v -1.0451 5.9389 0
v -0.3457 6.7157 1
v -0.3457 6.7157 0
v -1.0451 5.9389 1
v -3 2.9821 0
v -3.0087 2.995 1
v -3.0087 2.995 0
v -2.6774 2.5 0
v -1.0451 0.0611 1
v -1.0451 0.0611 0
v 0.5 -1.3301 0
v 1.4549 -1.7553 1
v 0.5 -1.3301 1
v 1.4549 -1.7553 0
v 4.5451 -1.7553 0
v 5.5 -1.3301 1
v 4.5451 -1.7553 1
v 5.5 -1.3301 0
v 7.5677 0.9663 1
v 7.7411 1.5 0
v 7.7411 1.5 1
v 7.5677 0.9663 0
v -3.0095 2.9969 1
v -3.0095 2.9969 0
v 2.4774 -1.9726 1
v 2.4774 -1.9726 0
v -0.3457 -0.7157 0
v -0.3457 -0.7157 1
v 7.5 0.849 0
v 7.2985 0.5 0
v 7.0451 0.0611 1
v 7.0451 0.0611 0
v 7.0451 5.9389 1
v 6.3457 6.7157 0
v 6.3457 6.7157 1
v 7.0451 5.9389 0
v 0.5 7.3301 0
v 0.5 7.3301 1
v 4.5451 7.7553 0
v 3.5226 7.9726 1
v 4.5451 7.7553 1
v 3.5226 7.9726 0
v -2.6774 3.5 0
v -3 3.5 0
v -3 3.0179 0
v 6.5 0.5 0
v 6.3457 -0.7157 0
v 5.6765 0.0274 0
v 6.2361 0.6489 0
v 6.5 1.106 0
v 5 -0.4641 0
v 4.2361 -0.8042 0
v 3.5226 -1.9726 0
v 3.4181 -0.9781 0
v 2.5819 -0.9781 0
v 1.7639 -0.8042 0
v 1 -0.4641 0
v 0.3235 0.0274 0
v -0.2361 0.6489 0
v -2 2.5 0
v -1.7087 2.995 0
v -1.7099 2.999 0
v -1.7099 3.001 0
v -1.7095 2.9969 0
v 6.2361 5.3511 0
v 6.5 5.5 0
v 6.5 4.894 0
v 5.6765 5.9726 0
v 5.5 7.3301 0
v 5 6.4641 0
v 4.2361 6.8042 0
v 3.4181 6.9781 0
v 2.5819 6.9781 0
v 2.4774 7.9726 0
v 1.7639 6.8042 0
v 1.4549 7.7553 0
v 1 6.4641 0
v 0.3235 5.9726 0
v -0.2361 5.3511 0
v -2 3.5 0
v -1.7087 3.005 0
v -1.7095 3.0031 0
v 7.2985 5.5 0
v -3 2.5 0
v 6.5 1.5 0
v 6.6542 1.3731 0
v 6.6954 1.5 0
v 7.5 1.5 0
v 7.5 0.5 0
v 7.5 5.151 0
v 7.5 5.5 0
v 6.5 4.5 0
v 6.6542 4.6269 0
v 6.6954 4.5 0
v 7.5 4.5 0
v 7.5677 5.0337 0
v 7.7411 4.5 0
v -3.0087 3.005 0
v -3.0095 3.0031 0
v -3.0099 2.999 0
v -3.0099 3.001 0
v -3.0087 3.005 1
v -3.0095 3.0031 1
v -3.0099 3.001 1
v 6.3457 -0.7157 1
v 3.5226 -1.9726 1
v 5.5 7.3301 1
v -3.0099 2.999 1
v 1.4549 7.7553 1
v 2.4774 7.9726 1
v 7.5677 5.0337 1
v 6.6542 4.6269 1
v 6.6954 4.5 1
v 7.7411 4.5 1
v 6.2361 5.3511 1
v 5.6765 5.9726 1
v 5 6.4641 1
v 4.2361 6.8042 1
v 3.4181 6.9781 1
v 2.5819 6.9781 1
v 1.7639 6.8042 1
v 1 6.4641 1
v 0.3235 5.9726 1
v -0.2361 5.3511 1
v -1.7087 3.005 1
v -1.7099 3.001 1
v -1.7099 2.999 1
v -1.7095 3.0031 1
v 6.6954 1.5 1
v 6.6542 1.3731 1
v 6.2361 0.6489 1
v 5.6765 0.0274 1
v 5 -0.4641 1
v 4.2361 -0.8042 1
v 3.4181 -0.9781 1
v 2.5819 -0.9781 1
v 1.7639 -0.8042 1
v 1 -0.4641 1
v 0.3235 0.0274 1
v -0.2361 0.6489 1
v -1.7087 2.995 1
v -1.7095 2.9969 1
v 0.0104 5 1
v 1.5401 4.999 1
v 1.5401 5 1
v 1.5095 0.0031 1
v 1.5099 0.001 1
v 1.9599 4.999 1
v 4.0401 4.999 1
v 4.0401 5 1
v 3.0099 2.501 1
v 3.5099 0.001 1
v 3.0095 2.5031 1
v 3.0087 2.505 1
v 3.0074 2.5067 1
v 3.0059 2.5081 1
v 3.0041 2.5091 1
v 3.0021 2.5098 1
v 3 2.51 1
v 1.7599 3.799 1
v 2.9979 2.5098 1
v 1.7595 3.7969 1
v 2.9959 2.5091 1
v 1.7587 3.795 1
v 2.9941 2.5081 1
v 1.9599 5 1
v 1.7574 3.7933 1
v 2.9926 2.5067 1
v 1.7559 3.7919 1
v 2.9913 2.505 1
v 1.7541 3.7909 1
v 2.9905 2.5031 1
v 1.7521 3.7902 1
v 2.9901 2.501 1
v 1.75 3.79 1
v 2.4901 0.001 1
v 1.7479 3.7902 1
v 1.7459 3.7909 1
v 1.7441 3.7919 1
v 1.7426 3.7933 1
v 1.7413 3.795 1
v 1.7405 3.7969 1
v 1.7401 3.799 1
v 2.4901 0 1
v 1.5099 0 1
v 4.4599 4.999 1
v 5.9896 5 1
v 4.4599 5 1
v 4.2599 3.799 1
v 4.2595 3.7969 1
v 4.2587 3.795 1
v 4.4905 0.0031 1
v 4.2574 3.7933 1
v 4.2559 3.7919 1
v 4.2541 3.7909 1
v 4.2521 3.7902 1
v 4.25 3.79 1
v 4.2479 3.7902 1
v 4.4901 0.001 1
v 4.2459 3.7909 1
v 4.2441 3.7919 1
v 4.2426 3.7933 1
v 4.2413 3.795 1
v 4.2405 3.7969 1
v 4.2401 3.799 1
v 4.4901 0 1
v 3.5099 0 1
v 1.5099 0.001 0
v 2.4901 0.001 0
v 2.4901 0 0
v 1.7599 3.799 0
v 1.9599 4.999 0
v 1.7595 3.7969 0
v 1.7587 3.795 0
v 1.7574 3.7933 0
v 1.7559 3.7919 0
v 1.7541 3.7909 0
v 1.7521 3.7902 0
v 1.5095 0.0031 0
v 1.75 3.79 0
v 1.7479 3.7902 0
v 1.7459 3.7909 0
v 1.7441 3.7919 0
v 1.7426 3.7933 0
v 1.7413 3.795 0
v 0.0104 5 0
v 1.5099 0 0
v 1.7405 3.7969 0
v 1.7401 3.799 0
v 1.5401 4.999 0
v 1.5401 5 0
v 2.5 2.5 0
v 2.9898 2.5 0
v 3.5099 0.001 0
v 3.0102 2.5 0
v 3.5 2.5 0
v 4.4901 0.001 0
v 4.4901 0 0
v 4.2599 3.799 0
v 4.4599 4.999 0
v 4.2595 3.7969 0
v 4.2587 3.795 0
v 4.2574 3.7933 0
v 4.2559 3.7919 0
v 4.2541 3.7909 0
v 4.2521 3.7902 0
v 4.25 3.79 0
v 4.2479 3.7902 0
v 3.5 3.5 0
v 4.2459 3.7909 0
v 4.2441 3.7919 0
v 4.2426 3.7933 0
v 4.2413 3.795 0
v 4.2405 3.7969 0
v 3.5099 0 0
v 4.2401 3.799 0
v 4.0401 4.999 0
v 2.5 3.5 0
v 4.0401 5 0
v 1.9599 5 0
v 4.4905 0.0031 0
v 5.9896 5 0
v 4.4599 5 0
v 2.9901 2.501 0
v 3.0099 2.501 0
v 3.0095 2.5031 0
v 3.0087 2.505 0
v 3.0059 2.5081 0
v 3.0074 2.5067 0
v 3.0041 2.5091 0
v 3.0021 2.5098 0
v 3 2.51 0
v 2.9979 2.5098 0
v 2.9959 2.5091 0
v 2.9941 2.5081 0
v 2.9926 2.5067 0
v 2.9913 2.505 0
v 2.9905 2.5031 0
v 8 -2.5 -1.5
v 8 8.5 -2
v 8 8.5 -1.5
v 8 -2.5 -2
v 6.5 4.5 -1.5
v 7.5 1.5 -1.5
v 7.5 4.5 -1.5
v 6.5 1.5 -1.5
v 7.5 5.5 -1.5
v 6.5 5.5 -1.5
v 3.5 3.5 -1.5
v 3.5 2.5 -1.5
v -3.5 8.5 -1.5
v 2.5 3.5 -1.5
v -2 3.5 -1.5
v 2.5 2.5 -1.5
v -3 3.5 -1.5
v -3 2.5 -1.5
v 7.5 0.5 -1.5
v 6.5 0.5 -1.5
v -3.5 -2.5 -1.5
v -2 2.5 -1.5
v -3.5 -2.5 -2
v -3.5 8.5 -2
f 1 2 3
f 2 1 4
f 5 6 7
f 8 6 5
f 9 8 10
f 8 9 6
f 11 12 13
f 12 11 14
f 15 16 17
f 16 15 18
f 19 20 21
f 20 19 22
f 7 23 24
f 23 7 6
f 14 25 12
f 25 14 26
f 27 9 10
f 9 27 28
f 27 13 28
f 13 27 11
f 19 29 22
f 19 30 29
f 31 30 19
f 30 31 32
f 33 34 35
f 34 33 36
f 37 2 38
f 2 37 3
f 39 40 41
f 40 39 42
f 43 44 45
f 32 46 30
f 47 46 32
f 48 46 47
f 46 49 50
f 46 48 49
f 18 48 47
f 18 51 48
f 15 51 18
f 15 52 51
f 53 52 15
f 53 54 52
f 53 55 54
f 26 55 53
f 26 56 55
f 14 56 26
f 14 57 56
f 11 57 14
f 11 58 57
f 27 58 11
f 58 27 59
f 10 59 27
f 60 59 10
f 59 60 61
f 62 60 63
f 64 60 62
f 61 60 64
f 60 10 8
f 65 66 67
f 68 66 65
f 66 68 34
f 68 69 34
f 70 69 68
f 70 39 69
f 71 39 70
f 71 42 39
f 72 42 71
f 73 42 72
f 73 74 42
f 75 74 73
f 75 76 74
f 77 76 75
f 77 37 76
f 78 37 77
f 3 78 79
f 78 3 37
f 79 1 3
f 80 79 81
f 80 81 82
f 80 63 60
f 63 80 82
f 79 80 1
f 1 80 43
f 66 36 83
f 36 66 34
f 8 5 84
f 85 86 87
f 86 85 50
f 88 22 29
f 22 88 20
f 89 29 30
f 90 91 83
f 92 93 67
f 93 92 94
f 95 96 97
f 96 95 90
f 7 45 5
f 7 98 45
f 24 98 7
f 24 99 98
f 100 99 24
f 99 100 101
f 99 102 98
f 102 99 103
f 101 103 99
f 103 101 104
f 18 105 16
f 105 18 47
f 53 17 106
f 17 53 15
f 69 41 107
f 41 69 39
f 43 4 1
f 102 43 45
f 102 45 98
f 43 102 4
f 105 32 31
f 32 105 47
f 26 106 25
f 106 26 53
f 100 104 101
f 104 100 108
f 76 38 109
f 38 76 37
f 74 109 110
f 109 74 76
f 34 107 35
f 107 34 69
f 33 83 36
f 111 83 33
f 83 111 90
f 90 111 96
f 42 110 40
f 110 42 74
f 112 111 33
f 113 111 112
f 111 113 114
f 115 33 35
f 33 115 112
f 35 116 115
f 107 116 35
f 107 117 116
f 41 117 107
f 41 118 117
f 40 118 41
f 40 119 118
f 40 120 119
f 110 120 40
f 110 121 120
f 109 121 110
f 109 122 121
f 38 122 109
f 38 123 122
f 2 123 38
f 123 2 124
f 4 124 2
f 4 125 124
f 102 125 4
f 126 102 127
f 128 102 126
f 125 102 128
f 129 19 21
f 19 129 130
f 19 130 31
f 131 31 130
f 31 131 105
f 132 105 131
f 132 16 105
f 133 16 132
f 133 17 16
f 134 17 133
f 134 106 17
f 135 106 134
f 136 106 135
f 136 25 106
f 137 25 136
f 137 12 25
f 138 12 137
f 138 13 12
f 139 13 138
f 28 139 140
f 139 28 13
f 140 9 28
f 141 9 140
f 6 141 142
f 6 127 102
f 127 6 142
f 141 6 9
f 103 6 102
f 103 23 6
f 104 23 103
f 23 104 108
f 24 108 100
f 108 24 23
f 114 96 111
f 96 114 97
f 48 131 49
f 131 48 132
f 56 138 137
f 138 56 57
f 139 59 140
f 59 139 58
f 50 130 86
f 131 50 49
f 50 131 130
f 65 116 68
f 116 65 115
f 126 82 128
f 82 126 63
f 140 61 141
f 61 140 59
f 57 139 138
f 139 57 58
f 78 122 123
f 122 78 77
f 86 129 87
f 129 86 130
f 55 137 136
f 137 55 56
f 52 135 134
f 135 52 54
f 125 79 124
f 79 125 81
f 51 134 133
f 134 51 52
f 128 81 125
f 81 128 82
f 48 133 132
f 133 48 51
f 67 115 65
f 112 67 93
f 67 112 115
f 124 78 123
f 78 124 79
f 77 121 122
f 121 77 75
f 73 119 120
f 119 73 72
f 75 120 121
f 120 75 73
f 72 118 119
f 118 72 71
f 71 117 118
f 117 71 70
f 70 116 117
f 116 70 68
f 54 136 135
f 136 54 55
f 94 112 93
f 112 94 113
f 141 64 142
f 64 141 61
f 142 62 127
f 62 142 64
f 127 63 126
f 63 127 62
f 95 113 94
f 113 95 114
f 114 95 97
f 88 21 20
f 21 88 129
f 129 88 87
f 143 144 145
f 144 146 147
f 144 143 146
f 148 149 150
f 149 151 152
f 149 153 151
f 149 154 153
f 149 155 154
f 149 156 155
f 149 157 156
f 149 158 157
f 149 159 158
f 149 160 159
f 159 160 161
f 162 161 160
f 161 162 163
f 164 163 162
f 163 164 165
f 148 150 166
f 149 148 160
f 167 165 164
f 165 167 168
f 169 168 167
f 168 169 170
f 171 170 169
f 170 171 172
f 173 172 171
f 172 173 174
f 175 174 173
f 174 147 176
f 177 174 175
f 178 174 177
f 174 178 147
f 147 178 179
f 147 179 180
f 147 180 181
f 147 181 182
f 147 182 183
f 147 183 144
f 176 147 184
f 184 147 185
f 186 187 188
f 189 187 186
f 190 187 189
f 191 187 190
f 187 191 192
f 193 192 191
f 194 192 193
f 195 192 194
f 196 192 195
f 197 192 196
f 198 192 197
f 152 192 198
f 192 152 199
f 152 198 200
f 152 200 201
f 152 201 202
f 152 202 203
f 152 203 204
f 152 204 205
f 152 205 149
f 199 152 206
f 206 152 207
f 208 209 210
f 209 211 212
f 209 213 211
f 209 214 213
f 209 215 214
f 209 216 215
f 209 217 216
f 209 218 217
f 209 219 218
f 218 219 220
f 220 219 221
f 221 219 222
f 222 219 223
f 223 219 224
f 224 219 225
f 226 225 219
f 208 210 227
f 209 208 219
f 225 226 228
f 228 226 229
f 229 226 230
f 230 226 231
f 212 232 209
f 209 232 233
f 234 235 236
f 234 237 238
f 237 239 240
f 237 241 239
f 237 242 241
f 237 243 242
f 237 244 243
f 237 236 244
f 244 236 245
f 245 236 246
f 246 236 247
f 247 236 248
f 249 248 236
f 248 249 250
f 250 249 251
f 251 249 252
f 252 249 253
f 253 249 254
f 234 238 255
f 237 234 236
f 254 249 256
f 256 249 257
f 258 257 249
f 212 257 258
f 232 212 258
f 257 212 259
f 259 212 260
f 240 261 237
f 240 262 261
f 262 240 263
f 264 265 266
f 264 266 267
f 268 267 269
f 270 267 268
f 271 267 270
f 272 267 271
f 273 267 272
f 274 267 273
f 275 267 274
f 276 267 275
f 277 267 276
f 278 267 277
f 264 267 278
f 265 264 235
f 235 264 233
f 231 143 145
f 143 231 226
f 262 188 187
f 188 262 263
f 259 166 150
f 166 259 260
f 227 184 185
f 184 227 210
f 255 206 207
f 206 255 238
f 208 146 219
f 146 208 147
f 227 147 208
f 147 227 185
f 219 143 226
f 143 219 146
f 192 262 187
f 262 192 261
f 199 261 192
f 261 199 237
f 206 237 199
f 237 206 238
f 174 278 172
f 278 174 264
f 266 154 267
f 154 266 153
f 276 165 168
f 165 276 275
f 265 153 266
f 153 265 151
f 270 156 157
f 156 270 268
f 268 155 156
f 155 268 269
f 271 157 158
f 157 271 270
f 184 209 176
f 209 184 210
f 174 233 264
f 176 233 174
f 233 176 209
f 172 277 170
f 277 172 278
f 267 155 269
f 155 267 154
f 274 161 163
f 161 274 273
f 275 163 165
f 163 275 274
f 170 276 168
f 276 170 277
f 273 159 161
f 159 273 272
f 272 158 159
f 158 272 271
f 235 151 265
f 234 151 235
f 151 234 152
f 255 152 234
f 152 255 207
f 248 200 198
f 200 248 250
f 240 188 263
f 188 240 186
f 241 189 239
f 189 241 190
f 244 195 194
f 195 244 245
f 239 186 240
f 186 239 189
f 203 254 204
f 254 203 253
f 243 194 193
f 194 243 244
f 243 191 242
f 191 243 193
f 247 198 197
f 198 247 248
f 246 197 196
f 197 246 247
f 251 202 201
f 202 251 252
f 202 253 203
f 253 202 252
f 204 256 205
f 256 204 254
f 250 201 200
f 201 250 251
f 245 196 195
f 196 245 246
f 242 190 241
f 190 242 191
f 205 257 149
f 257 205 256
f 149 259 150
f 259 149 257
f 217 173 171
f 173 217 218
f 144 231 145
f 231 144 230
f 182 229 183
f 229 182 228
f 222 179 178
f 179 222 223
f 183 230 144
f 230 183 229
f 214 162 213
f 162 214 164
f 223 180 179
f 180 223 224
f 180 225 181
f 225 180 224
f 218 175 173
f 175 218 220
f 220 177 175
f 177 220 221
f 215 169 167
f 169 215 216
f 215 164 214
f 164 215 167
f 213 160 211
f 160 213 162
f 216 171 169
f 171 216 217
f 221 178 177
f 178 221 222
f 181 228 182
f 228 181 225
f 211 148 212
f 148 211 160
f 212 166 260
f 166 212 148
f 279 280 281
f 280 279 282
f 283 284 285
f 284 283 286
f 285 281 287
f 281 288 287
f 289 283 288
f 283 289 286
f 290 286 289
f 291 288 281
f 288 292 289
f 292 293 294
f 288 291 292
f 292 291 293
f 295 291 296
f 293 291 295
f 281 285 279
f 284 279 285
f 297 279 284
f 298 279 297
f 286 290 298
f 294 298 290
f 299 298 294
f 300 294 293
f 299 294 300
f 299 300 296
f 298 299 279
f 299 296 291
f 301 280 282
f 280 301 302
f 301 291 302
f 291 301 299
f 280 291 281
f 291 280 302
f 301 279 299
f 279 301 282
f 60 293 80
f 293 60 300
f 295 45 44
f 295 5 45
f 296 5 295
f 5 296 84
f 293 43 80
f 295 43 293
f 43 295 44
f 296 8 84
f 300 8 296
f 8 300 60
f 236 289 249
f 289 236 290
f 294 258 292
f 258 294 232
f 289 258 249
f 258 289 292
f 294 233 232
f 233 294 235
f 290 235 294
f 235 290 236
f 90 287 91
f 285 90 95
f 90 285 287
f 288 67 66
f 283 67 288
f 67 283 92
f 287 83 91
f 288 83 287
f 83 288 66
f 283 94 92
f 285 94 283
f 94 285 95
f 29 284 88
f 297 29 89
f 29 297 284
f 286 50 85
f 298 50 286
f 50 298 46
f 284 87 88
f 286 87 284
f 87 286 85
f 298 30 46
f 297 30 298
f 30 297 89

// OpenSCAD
a =-2;
b = a+0.5;
c = abs(b);

//the base (biggest cube)
translate([-3.5,-2.5,a]) cube([11.5,11,0.5]);
//the cube at the left side
translate([-3,2.5,b])cube([1,1,c]);
//the cube at mid
translate([2.5,2.5,b])cube([1,1,c]);
//the cube at top-right side
translate([6.5,4.5,b])cube([1,1,c]);
//the cube at bottom-right side
translate([6.5,0.5,b])cube([1,1,c]);


// left triangle 
module tri_left(where){
translate([where,3,0]){
rotate([0,0,90]){
triangle(1,1,0.01,1);
mirror([1,0,0]) triangle(1,1,0.01,1);

}
}
}
//sub-surface
$fn = 30;
// bigger circle - smaller circle and move the centre -side cube
difference(){
difference(){
    // merge left trianlge with the circle
    hull(){
   translate([3,3,0]) {cylinder(r=5,h=1);}
   tri_left(-2);
   }
   //merge inside left triangle with the circle
   hull(){
   translate([3,3,0]) {cylinder(r=4,h=1);}
   tri_left(-0.7);
   }
}

// side cube
translate([6.5,1.5,0]){cube([2.5,3,1]);}
}

//cube - triagle(origin) - triangle(non origin) - triangle(bottom) - triangle(top)
difference(){
difference(){
difference(){
difference(){
cube([6,5,1]);
  // rotate the right triangle 90 degree and mirror it
    mirror([1,0,0])rotate([0,0,90]){ triangle(5,1.5,0.01,1);} 

}
// 2nd triangle (non-origin)
 translate([6,0,0])rotate([0,0,90]){ triangle(5,1.5,0.01,1);} 
}
//call bottom triangle
bottom_triangle();
}
top_triangle();
}

// top triangles
module top_triangle(){
 //right one
gen_for_top(4.25);

//left one
mirror([1,0,0])
gen_for_top(-1.75);
}

// function to generate top triangle
module gen_for_top(where){
 translate([where,5,0]) {
rotate([0,0,-90]){ triangle(1.2,0.2,0.01,1);}
mirror([1,0,0])rotate([0,0,-90]){ triangle(1.2,0.2,0.01,1);}
}
}

//bottom triangle
module bottom_triangle(){
translate([3,0,0]) {
rotate([0,0,90]){ triangle(2.5,0.5,0.01,1);}
mirror([1,0,0])rotate([0,0,90]){ triangle(2.5,0.5,0.01,1);}
}
}
 
//generate  triangle
module triangle(a1,b1,r1,h1){
 
 hull(){
     cylinder(r=r1,h=h1);
     translate([a1,0,0])cylinder(r=r1,h=h1);
      translate([0,b1,0])cylinder(r=r1,h=h1);
 }
 
   
}
